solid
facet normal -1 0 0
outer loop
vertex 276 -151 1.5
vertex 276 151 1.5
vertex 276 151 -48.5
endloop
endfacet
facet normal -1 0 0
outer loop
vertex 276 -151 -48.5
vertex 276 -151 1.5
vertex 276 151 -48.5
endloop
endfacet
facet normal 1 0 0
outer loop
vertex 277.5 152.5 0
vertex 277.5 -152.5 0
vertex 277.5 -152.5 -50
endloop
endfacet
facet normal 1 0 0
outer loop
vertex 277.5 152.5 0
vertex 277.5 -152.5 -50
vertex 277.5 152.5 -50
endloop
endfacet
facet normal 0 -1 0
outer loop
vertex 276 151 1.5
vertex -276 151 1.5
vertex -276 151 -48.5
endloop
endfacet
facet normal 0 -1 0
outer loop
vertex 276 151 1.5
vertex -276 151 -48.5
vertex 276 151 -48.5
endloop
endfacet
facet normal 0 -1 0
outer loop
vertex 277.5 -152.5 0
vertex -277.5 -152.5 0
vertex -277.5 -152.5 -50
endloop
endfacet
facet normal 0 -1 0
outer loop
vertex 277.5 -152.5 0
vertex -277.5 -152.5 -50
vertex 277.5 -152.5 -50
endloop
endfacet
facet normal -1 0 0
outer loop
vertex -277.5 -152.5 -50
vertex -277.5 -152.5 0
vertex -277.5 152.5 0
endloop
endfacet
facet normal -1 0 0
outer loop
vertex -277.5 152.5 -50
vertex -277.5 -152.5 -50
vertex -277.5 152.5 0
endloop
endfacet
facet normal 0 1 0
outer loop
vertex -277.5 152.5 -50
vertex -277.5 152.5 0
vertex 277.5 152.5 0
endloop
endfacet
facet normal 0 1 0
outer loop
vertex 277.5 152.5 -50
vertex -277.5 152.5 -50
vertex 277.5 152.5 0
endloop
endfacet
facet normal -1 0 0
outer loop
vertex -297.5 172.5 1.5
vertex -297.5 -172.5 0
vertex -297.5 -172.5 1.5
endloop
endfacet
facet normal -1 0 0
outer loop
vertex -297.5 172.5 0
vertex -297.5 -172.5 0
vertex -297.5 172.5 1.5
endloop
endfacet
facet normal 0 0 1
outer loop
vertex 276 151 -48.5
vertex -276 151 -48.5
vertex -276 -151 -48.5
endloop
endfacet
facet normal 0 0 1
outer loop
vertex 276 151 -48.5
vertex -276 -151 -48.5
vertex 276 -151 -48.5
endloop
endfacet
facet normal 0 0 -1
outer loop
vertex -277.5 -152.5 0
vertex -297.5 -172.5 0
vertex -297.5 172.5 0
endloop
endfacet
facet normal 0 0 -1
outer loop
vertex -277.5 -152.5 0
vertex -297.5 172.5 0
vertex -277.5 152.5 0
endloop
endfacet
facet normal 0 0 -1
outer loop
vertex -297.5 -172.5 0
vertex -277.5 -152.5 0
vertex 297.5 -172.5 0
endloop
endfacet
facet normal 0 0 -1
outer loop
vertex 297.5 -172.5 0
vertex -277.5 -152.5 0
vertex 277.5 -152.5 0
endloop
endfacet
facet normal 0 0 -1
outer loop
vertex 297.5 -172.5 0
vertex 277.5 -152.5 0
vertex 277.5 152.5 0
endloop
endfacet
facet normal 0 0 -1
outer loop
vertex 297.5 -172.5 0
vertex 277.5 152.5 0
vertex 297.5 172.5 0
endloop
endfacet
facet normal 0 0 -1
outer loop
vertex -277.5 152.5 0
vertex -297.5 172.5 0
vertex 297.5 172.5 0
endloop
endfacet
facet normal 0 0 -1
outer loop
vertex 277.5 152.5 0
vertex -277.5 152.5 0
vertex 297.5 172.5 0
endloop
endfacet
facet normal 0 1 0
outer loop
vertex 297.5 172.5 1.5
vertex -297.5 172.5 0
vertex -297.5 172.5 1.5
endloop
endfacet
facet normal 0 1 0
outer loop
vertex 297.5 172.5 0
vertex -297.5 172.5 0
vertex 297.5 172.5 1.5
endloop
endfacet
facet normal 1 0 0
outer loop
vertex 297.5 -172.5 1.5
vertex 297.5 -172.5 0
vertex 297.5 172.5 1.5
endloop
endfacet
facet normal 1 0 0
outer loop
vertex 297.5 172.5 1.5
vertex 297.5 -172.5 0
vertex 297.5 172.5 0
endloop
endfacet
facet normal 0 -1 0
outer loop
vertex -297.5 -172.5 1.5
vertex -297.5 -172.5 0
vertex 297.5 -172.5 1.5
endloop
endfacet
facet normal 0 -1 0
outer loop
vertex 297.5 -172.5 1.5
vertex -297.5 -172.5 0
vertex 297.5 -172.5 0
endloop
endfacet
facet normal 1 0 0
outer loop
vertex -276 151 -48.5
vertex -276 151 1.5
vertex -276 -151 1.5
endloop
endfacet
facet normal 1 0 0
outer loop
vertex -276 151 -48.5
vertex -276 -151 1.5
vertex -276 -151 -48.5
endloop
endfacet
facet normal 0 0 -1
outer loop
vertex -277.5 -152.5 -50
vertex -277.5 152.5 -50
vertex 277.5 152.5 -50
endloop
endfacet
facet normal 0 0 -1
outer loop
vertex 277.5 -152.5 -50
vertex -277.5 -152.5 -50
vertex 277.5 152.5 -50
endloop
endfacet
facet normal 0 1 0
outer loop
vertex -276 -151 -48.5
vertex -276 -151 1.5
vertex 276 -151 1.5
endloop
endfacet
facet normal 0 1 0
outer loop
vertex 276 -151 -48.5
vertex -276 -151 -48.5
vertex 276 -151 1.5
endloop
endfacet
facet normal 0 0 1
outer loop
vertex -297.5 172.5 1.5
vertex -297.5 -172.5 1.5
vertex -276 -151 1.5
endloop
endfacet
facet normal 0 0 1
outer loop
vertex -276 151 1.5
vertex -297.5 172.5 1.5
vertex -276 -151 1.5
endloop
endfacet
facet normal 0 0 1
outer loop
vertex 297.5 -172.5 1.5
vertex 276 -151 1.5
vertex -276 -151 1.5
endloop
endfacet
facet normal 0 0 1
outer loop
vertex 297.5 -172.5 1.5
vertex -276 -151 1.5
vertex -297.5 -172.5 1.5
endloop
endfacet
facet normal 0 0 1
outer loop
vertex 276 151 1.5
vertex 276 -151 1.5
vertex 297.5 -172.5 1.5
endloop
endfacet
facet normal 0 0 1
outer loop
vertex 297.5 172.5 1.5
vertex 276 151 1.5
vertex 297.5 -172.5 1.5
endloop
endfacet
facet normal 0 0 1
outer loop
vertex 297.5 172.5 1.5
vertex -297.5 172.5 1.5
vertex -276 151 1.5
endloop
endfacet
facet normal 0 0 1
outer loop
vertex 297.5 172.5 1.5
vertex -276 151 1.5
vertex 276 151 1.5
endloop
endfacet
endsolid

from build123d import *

# Parameters (mm, degrees)
F0_W        = 555
F0_H        = 305
F1_DEPTH    = 50
F2_W        = 595
F2_H        = 345
F2_W_2      = 555
F2_H_2      = 305
F3_DEPTH    = 1.5
F4_T        = 1.5
F4_T3_DEPTH = 308
F4_T5_DEPTH = 558


# Not quite as in the source:
# - a shell that OpenCascade refuses in one call is made with other operations: the cavity is built on its own and cut out


with BuildPart() as f1:
    # F0 (on Top) → F1 (new body)
    with BuildSketch(Plane.XY):
        Rectangle(F0_W, F0_H)
    extrude(amount=-F1_DEPTH)

    # F2 (on face) → F3 (join)
    with BuildSketch(Plane.XY):
        Rectangle(F2_W, F2_H)
        Rectangle(F2_W_2, F2_H_2, mode=Mode.SUBTRACT)
        Rectangle(F2_W_2, F2_H_2)
    extrude(amount=F3_DEPTH)

    # F4: shell of thickness 1.5, made by hand


with BuildPart() as f4_core1:
    # F4_t2: copy of F1
    add(f1.part)

    # the walls: a layer under each face that stays
    f4_faces = [f4_core1.faces().sort_by_distance(p)[0] for p in [
        (-297.5, 0, 0.75),
        (0, 172.5, 0.75),
        (0, -172.5, 0.75),
        (-277.6666666667, -161, 0),
        (297.5, 0, 0.75),
        (-277.5, 0, -25),
        (0, -152.5, -25),
        (277.5, 0, -25),
        (0, 152.5, -25),
        (0, 0, -50),
    ]]
    thicken(f4_faces, amount=-F4_T, mode=Mode.SUBTRACT)

    # F4_s4 → F4_t3 (cut)
    with BuildSketch(Plane.XZ.offset(-154)):
        Polygon((-277.515, -0.015), (-277.5, 1.5), (-276, 1.5), (-276, 0), align=None)
        Polygon((277.515, -0.015), (277.5, 1.5), (276, 1.5), (276, 0), align=None)
    extrude(amount=F4_T3_DEPTH, mode=Mode.SUBTRACT)

    # F4_s6 → F4_t5 (cut)
    with BuildSketch(Plane.YZ.offset(-279)):
        Polygon((-152.515, -0.015), (-152.5, 1.5), (-151, 1.5), (-151, 0), align=None)
        Polygon((152.515, -0.015), (152.5, 1.5), (151, 1.5), (151, 0), align=None)
    extrude(amount=F4_T5_DEPTH, mode=Mode.SUBTRACT)


with BuildPart() as f1_1:
    add(f1.part)

    # what is left inside the walls is the cavity
    f4_cavity = [f4_core1.part.solids().sort_by_distance(p)[0] for p in [
        (0, -50.333333, -48.485),
    ]]
    add(f4_cavity, mode=Mode.SUBTRACT)


solid = f1_1.part
